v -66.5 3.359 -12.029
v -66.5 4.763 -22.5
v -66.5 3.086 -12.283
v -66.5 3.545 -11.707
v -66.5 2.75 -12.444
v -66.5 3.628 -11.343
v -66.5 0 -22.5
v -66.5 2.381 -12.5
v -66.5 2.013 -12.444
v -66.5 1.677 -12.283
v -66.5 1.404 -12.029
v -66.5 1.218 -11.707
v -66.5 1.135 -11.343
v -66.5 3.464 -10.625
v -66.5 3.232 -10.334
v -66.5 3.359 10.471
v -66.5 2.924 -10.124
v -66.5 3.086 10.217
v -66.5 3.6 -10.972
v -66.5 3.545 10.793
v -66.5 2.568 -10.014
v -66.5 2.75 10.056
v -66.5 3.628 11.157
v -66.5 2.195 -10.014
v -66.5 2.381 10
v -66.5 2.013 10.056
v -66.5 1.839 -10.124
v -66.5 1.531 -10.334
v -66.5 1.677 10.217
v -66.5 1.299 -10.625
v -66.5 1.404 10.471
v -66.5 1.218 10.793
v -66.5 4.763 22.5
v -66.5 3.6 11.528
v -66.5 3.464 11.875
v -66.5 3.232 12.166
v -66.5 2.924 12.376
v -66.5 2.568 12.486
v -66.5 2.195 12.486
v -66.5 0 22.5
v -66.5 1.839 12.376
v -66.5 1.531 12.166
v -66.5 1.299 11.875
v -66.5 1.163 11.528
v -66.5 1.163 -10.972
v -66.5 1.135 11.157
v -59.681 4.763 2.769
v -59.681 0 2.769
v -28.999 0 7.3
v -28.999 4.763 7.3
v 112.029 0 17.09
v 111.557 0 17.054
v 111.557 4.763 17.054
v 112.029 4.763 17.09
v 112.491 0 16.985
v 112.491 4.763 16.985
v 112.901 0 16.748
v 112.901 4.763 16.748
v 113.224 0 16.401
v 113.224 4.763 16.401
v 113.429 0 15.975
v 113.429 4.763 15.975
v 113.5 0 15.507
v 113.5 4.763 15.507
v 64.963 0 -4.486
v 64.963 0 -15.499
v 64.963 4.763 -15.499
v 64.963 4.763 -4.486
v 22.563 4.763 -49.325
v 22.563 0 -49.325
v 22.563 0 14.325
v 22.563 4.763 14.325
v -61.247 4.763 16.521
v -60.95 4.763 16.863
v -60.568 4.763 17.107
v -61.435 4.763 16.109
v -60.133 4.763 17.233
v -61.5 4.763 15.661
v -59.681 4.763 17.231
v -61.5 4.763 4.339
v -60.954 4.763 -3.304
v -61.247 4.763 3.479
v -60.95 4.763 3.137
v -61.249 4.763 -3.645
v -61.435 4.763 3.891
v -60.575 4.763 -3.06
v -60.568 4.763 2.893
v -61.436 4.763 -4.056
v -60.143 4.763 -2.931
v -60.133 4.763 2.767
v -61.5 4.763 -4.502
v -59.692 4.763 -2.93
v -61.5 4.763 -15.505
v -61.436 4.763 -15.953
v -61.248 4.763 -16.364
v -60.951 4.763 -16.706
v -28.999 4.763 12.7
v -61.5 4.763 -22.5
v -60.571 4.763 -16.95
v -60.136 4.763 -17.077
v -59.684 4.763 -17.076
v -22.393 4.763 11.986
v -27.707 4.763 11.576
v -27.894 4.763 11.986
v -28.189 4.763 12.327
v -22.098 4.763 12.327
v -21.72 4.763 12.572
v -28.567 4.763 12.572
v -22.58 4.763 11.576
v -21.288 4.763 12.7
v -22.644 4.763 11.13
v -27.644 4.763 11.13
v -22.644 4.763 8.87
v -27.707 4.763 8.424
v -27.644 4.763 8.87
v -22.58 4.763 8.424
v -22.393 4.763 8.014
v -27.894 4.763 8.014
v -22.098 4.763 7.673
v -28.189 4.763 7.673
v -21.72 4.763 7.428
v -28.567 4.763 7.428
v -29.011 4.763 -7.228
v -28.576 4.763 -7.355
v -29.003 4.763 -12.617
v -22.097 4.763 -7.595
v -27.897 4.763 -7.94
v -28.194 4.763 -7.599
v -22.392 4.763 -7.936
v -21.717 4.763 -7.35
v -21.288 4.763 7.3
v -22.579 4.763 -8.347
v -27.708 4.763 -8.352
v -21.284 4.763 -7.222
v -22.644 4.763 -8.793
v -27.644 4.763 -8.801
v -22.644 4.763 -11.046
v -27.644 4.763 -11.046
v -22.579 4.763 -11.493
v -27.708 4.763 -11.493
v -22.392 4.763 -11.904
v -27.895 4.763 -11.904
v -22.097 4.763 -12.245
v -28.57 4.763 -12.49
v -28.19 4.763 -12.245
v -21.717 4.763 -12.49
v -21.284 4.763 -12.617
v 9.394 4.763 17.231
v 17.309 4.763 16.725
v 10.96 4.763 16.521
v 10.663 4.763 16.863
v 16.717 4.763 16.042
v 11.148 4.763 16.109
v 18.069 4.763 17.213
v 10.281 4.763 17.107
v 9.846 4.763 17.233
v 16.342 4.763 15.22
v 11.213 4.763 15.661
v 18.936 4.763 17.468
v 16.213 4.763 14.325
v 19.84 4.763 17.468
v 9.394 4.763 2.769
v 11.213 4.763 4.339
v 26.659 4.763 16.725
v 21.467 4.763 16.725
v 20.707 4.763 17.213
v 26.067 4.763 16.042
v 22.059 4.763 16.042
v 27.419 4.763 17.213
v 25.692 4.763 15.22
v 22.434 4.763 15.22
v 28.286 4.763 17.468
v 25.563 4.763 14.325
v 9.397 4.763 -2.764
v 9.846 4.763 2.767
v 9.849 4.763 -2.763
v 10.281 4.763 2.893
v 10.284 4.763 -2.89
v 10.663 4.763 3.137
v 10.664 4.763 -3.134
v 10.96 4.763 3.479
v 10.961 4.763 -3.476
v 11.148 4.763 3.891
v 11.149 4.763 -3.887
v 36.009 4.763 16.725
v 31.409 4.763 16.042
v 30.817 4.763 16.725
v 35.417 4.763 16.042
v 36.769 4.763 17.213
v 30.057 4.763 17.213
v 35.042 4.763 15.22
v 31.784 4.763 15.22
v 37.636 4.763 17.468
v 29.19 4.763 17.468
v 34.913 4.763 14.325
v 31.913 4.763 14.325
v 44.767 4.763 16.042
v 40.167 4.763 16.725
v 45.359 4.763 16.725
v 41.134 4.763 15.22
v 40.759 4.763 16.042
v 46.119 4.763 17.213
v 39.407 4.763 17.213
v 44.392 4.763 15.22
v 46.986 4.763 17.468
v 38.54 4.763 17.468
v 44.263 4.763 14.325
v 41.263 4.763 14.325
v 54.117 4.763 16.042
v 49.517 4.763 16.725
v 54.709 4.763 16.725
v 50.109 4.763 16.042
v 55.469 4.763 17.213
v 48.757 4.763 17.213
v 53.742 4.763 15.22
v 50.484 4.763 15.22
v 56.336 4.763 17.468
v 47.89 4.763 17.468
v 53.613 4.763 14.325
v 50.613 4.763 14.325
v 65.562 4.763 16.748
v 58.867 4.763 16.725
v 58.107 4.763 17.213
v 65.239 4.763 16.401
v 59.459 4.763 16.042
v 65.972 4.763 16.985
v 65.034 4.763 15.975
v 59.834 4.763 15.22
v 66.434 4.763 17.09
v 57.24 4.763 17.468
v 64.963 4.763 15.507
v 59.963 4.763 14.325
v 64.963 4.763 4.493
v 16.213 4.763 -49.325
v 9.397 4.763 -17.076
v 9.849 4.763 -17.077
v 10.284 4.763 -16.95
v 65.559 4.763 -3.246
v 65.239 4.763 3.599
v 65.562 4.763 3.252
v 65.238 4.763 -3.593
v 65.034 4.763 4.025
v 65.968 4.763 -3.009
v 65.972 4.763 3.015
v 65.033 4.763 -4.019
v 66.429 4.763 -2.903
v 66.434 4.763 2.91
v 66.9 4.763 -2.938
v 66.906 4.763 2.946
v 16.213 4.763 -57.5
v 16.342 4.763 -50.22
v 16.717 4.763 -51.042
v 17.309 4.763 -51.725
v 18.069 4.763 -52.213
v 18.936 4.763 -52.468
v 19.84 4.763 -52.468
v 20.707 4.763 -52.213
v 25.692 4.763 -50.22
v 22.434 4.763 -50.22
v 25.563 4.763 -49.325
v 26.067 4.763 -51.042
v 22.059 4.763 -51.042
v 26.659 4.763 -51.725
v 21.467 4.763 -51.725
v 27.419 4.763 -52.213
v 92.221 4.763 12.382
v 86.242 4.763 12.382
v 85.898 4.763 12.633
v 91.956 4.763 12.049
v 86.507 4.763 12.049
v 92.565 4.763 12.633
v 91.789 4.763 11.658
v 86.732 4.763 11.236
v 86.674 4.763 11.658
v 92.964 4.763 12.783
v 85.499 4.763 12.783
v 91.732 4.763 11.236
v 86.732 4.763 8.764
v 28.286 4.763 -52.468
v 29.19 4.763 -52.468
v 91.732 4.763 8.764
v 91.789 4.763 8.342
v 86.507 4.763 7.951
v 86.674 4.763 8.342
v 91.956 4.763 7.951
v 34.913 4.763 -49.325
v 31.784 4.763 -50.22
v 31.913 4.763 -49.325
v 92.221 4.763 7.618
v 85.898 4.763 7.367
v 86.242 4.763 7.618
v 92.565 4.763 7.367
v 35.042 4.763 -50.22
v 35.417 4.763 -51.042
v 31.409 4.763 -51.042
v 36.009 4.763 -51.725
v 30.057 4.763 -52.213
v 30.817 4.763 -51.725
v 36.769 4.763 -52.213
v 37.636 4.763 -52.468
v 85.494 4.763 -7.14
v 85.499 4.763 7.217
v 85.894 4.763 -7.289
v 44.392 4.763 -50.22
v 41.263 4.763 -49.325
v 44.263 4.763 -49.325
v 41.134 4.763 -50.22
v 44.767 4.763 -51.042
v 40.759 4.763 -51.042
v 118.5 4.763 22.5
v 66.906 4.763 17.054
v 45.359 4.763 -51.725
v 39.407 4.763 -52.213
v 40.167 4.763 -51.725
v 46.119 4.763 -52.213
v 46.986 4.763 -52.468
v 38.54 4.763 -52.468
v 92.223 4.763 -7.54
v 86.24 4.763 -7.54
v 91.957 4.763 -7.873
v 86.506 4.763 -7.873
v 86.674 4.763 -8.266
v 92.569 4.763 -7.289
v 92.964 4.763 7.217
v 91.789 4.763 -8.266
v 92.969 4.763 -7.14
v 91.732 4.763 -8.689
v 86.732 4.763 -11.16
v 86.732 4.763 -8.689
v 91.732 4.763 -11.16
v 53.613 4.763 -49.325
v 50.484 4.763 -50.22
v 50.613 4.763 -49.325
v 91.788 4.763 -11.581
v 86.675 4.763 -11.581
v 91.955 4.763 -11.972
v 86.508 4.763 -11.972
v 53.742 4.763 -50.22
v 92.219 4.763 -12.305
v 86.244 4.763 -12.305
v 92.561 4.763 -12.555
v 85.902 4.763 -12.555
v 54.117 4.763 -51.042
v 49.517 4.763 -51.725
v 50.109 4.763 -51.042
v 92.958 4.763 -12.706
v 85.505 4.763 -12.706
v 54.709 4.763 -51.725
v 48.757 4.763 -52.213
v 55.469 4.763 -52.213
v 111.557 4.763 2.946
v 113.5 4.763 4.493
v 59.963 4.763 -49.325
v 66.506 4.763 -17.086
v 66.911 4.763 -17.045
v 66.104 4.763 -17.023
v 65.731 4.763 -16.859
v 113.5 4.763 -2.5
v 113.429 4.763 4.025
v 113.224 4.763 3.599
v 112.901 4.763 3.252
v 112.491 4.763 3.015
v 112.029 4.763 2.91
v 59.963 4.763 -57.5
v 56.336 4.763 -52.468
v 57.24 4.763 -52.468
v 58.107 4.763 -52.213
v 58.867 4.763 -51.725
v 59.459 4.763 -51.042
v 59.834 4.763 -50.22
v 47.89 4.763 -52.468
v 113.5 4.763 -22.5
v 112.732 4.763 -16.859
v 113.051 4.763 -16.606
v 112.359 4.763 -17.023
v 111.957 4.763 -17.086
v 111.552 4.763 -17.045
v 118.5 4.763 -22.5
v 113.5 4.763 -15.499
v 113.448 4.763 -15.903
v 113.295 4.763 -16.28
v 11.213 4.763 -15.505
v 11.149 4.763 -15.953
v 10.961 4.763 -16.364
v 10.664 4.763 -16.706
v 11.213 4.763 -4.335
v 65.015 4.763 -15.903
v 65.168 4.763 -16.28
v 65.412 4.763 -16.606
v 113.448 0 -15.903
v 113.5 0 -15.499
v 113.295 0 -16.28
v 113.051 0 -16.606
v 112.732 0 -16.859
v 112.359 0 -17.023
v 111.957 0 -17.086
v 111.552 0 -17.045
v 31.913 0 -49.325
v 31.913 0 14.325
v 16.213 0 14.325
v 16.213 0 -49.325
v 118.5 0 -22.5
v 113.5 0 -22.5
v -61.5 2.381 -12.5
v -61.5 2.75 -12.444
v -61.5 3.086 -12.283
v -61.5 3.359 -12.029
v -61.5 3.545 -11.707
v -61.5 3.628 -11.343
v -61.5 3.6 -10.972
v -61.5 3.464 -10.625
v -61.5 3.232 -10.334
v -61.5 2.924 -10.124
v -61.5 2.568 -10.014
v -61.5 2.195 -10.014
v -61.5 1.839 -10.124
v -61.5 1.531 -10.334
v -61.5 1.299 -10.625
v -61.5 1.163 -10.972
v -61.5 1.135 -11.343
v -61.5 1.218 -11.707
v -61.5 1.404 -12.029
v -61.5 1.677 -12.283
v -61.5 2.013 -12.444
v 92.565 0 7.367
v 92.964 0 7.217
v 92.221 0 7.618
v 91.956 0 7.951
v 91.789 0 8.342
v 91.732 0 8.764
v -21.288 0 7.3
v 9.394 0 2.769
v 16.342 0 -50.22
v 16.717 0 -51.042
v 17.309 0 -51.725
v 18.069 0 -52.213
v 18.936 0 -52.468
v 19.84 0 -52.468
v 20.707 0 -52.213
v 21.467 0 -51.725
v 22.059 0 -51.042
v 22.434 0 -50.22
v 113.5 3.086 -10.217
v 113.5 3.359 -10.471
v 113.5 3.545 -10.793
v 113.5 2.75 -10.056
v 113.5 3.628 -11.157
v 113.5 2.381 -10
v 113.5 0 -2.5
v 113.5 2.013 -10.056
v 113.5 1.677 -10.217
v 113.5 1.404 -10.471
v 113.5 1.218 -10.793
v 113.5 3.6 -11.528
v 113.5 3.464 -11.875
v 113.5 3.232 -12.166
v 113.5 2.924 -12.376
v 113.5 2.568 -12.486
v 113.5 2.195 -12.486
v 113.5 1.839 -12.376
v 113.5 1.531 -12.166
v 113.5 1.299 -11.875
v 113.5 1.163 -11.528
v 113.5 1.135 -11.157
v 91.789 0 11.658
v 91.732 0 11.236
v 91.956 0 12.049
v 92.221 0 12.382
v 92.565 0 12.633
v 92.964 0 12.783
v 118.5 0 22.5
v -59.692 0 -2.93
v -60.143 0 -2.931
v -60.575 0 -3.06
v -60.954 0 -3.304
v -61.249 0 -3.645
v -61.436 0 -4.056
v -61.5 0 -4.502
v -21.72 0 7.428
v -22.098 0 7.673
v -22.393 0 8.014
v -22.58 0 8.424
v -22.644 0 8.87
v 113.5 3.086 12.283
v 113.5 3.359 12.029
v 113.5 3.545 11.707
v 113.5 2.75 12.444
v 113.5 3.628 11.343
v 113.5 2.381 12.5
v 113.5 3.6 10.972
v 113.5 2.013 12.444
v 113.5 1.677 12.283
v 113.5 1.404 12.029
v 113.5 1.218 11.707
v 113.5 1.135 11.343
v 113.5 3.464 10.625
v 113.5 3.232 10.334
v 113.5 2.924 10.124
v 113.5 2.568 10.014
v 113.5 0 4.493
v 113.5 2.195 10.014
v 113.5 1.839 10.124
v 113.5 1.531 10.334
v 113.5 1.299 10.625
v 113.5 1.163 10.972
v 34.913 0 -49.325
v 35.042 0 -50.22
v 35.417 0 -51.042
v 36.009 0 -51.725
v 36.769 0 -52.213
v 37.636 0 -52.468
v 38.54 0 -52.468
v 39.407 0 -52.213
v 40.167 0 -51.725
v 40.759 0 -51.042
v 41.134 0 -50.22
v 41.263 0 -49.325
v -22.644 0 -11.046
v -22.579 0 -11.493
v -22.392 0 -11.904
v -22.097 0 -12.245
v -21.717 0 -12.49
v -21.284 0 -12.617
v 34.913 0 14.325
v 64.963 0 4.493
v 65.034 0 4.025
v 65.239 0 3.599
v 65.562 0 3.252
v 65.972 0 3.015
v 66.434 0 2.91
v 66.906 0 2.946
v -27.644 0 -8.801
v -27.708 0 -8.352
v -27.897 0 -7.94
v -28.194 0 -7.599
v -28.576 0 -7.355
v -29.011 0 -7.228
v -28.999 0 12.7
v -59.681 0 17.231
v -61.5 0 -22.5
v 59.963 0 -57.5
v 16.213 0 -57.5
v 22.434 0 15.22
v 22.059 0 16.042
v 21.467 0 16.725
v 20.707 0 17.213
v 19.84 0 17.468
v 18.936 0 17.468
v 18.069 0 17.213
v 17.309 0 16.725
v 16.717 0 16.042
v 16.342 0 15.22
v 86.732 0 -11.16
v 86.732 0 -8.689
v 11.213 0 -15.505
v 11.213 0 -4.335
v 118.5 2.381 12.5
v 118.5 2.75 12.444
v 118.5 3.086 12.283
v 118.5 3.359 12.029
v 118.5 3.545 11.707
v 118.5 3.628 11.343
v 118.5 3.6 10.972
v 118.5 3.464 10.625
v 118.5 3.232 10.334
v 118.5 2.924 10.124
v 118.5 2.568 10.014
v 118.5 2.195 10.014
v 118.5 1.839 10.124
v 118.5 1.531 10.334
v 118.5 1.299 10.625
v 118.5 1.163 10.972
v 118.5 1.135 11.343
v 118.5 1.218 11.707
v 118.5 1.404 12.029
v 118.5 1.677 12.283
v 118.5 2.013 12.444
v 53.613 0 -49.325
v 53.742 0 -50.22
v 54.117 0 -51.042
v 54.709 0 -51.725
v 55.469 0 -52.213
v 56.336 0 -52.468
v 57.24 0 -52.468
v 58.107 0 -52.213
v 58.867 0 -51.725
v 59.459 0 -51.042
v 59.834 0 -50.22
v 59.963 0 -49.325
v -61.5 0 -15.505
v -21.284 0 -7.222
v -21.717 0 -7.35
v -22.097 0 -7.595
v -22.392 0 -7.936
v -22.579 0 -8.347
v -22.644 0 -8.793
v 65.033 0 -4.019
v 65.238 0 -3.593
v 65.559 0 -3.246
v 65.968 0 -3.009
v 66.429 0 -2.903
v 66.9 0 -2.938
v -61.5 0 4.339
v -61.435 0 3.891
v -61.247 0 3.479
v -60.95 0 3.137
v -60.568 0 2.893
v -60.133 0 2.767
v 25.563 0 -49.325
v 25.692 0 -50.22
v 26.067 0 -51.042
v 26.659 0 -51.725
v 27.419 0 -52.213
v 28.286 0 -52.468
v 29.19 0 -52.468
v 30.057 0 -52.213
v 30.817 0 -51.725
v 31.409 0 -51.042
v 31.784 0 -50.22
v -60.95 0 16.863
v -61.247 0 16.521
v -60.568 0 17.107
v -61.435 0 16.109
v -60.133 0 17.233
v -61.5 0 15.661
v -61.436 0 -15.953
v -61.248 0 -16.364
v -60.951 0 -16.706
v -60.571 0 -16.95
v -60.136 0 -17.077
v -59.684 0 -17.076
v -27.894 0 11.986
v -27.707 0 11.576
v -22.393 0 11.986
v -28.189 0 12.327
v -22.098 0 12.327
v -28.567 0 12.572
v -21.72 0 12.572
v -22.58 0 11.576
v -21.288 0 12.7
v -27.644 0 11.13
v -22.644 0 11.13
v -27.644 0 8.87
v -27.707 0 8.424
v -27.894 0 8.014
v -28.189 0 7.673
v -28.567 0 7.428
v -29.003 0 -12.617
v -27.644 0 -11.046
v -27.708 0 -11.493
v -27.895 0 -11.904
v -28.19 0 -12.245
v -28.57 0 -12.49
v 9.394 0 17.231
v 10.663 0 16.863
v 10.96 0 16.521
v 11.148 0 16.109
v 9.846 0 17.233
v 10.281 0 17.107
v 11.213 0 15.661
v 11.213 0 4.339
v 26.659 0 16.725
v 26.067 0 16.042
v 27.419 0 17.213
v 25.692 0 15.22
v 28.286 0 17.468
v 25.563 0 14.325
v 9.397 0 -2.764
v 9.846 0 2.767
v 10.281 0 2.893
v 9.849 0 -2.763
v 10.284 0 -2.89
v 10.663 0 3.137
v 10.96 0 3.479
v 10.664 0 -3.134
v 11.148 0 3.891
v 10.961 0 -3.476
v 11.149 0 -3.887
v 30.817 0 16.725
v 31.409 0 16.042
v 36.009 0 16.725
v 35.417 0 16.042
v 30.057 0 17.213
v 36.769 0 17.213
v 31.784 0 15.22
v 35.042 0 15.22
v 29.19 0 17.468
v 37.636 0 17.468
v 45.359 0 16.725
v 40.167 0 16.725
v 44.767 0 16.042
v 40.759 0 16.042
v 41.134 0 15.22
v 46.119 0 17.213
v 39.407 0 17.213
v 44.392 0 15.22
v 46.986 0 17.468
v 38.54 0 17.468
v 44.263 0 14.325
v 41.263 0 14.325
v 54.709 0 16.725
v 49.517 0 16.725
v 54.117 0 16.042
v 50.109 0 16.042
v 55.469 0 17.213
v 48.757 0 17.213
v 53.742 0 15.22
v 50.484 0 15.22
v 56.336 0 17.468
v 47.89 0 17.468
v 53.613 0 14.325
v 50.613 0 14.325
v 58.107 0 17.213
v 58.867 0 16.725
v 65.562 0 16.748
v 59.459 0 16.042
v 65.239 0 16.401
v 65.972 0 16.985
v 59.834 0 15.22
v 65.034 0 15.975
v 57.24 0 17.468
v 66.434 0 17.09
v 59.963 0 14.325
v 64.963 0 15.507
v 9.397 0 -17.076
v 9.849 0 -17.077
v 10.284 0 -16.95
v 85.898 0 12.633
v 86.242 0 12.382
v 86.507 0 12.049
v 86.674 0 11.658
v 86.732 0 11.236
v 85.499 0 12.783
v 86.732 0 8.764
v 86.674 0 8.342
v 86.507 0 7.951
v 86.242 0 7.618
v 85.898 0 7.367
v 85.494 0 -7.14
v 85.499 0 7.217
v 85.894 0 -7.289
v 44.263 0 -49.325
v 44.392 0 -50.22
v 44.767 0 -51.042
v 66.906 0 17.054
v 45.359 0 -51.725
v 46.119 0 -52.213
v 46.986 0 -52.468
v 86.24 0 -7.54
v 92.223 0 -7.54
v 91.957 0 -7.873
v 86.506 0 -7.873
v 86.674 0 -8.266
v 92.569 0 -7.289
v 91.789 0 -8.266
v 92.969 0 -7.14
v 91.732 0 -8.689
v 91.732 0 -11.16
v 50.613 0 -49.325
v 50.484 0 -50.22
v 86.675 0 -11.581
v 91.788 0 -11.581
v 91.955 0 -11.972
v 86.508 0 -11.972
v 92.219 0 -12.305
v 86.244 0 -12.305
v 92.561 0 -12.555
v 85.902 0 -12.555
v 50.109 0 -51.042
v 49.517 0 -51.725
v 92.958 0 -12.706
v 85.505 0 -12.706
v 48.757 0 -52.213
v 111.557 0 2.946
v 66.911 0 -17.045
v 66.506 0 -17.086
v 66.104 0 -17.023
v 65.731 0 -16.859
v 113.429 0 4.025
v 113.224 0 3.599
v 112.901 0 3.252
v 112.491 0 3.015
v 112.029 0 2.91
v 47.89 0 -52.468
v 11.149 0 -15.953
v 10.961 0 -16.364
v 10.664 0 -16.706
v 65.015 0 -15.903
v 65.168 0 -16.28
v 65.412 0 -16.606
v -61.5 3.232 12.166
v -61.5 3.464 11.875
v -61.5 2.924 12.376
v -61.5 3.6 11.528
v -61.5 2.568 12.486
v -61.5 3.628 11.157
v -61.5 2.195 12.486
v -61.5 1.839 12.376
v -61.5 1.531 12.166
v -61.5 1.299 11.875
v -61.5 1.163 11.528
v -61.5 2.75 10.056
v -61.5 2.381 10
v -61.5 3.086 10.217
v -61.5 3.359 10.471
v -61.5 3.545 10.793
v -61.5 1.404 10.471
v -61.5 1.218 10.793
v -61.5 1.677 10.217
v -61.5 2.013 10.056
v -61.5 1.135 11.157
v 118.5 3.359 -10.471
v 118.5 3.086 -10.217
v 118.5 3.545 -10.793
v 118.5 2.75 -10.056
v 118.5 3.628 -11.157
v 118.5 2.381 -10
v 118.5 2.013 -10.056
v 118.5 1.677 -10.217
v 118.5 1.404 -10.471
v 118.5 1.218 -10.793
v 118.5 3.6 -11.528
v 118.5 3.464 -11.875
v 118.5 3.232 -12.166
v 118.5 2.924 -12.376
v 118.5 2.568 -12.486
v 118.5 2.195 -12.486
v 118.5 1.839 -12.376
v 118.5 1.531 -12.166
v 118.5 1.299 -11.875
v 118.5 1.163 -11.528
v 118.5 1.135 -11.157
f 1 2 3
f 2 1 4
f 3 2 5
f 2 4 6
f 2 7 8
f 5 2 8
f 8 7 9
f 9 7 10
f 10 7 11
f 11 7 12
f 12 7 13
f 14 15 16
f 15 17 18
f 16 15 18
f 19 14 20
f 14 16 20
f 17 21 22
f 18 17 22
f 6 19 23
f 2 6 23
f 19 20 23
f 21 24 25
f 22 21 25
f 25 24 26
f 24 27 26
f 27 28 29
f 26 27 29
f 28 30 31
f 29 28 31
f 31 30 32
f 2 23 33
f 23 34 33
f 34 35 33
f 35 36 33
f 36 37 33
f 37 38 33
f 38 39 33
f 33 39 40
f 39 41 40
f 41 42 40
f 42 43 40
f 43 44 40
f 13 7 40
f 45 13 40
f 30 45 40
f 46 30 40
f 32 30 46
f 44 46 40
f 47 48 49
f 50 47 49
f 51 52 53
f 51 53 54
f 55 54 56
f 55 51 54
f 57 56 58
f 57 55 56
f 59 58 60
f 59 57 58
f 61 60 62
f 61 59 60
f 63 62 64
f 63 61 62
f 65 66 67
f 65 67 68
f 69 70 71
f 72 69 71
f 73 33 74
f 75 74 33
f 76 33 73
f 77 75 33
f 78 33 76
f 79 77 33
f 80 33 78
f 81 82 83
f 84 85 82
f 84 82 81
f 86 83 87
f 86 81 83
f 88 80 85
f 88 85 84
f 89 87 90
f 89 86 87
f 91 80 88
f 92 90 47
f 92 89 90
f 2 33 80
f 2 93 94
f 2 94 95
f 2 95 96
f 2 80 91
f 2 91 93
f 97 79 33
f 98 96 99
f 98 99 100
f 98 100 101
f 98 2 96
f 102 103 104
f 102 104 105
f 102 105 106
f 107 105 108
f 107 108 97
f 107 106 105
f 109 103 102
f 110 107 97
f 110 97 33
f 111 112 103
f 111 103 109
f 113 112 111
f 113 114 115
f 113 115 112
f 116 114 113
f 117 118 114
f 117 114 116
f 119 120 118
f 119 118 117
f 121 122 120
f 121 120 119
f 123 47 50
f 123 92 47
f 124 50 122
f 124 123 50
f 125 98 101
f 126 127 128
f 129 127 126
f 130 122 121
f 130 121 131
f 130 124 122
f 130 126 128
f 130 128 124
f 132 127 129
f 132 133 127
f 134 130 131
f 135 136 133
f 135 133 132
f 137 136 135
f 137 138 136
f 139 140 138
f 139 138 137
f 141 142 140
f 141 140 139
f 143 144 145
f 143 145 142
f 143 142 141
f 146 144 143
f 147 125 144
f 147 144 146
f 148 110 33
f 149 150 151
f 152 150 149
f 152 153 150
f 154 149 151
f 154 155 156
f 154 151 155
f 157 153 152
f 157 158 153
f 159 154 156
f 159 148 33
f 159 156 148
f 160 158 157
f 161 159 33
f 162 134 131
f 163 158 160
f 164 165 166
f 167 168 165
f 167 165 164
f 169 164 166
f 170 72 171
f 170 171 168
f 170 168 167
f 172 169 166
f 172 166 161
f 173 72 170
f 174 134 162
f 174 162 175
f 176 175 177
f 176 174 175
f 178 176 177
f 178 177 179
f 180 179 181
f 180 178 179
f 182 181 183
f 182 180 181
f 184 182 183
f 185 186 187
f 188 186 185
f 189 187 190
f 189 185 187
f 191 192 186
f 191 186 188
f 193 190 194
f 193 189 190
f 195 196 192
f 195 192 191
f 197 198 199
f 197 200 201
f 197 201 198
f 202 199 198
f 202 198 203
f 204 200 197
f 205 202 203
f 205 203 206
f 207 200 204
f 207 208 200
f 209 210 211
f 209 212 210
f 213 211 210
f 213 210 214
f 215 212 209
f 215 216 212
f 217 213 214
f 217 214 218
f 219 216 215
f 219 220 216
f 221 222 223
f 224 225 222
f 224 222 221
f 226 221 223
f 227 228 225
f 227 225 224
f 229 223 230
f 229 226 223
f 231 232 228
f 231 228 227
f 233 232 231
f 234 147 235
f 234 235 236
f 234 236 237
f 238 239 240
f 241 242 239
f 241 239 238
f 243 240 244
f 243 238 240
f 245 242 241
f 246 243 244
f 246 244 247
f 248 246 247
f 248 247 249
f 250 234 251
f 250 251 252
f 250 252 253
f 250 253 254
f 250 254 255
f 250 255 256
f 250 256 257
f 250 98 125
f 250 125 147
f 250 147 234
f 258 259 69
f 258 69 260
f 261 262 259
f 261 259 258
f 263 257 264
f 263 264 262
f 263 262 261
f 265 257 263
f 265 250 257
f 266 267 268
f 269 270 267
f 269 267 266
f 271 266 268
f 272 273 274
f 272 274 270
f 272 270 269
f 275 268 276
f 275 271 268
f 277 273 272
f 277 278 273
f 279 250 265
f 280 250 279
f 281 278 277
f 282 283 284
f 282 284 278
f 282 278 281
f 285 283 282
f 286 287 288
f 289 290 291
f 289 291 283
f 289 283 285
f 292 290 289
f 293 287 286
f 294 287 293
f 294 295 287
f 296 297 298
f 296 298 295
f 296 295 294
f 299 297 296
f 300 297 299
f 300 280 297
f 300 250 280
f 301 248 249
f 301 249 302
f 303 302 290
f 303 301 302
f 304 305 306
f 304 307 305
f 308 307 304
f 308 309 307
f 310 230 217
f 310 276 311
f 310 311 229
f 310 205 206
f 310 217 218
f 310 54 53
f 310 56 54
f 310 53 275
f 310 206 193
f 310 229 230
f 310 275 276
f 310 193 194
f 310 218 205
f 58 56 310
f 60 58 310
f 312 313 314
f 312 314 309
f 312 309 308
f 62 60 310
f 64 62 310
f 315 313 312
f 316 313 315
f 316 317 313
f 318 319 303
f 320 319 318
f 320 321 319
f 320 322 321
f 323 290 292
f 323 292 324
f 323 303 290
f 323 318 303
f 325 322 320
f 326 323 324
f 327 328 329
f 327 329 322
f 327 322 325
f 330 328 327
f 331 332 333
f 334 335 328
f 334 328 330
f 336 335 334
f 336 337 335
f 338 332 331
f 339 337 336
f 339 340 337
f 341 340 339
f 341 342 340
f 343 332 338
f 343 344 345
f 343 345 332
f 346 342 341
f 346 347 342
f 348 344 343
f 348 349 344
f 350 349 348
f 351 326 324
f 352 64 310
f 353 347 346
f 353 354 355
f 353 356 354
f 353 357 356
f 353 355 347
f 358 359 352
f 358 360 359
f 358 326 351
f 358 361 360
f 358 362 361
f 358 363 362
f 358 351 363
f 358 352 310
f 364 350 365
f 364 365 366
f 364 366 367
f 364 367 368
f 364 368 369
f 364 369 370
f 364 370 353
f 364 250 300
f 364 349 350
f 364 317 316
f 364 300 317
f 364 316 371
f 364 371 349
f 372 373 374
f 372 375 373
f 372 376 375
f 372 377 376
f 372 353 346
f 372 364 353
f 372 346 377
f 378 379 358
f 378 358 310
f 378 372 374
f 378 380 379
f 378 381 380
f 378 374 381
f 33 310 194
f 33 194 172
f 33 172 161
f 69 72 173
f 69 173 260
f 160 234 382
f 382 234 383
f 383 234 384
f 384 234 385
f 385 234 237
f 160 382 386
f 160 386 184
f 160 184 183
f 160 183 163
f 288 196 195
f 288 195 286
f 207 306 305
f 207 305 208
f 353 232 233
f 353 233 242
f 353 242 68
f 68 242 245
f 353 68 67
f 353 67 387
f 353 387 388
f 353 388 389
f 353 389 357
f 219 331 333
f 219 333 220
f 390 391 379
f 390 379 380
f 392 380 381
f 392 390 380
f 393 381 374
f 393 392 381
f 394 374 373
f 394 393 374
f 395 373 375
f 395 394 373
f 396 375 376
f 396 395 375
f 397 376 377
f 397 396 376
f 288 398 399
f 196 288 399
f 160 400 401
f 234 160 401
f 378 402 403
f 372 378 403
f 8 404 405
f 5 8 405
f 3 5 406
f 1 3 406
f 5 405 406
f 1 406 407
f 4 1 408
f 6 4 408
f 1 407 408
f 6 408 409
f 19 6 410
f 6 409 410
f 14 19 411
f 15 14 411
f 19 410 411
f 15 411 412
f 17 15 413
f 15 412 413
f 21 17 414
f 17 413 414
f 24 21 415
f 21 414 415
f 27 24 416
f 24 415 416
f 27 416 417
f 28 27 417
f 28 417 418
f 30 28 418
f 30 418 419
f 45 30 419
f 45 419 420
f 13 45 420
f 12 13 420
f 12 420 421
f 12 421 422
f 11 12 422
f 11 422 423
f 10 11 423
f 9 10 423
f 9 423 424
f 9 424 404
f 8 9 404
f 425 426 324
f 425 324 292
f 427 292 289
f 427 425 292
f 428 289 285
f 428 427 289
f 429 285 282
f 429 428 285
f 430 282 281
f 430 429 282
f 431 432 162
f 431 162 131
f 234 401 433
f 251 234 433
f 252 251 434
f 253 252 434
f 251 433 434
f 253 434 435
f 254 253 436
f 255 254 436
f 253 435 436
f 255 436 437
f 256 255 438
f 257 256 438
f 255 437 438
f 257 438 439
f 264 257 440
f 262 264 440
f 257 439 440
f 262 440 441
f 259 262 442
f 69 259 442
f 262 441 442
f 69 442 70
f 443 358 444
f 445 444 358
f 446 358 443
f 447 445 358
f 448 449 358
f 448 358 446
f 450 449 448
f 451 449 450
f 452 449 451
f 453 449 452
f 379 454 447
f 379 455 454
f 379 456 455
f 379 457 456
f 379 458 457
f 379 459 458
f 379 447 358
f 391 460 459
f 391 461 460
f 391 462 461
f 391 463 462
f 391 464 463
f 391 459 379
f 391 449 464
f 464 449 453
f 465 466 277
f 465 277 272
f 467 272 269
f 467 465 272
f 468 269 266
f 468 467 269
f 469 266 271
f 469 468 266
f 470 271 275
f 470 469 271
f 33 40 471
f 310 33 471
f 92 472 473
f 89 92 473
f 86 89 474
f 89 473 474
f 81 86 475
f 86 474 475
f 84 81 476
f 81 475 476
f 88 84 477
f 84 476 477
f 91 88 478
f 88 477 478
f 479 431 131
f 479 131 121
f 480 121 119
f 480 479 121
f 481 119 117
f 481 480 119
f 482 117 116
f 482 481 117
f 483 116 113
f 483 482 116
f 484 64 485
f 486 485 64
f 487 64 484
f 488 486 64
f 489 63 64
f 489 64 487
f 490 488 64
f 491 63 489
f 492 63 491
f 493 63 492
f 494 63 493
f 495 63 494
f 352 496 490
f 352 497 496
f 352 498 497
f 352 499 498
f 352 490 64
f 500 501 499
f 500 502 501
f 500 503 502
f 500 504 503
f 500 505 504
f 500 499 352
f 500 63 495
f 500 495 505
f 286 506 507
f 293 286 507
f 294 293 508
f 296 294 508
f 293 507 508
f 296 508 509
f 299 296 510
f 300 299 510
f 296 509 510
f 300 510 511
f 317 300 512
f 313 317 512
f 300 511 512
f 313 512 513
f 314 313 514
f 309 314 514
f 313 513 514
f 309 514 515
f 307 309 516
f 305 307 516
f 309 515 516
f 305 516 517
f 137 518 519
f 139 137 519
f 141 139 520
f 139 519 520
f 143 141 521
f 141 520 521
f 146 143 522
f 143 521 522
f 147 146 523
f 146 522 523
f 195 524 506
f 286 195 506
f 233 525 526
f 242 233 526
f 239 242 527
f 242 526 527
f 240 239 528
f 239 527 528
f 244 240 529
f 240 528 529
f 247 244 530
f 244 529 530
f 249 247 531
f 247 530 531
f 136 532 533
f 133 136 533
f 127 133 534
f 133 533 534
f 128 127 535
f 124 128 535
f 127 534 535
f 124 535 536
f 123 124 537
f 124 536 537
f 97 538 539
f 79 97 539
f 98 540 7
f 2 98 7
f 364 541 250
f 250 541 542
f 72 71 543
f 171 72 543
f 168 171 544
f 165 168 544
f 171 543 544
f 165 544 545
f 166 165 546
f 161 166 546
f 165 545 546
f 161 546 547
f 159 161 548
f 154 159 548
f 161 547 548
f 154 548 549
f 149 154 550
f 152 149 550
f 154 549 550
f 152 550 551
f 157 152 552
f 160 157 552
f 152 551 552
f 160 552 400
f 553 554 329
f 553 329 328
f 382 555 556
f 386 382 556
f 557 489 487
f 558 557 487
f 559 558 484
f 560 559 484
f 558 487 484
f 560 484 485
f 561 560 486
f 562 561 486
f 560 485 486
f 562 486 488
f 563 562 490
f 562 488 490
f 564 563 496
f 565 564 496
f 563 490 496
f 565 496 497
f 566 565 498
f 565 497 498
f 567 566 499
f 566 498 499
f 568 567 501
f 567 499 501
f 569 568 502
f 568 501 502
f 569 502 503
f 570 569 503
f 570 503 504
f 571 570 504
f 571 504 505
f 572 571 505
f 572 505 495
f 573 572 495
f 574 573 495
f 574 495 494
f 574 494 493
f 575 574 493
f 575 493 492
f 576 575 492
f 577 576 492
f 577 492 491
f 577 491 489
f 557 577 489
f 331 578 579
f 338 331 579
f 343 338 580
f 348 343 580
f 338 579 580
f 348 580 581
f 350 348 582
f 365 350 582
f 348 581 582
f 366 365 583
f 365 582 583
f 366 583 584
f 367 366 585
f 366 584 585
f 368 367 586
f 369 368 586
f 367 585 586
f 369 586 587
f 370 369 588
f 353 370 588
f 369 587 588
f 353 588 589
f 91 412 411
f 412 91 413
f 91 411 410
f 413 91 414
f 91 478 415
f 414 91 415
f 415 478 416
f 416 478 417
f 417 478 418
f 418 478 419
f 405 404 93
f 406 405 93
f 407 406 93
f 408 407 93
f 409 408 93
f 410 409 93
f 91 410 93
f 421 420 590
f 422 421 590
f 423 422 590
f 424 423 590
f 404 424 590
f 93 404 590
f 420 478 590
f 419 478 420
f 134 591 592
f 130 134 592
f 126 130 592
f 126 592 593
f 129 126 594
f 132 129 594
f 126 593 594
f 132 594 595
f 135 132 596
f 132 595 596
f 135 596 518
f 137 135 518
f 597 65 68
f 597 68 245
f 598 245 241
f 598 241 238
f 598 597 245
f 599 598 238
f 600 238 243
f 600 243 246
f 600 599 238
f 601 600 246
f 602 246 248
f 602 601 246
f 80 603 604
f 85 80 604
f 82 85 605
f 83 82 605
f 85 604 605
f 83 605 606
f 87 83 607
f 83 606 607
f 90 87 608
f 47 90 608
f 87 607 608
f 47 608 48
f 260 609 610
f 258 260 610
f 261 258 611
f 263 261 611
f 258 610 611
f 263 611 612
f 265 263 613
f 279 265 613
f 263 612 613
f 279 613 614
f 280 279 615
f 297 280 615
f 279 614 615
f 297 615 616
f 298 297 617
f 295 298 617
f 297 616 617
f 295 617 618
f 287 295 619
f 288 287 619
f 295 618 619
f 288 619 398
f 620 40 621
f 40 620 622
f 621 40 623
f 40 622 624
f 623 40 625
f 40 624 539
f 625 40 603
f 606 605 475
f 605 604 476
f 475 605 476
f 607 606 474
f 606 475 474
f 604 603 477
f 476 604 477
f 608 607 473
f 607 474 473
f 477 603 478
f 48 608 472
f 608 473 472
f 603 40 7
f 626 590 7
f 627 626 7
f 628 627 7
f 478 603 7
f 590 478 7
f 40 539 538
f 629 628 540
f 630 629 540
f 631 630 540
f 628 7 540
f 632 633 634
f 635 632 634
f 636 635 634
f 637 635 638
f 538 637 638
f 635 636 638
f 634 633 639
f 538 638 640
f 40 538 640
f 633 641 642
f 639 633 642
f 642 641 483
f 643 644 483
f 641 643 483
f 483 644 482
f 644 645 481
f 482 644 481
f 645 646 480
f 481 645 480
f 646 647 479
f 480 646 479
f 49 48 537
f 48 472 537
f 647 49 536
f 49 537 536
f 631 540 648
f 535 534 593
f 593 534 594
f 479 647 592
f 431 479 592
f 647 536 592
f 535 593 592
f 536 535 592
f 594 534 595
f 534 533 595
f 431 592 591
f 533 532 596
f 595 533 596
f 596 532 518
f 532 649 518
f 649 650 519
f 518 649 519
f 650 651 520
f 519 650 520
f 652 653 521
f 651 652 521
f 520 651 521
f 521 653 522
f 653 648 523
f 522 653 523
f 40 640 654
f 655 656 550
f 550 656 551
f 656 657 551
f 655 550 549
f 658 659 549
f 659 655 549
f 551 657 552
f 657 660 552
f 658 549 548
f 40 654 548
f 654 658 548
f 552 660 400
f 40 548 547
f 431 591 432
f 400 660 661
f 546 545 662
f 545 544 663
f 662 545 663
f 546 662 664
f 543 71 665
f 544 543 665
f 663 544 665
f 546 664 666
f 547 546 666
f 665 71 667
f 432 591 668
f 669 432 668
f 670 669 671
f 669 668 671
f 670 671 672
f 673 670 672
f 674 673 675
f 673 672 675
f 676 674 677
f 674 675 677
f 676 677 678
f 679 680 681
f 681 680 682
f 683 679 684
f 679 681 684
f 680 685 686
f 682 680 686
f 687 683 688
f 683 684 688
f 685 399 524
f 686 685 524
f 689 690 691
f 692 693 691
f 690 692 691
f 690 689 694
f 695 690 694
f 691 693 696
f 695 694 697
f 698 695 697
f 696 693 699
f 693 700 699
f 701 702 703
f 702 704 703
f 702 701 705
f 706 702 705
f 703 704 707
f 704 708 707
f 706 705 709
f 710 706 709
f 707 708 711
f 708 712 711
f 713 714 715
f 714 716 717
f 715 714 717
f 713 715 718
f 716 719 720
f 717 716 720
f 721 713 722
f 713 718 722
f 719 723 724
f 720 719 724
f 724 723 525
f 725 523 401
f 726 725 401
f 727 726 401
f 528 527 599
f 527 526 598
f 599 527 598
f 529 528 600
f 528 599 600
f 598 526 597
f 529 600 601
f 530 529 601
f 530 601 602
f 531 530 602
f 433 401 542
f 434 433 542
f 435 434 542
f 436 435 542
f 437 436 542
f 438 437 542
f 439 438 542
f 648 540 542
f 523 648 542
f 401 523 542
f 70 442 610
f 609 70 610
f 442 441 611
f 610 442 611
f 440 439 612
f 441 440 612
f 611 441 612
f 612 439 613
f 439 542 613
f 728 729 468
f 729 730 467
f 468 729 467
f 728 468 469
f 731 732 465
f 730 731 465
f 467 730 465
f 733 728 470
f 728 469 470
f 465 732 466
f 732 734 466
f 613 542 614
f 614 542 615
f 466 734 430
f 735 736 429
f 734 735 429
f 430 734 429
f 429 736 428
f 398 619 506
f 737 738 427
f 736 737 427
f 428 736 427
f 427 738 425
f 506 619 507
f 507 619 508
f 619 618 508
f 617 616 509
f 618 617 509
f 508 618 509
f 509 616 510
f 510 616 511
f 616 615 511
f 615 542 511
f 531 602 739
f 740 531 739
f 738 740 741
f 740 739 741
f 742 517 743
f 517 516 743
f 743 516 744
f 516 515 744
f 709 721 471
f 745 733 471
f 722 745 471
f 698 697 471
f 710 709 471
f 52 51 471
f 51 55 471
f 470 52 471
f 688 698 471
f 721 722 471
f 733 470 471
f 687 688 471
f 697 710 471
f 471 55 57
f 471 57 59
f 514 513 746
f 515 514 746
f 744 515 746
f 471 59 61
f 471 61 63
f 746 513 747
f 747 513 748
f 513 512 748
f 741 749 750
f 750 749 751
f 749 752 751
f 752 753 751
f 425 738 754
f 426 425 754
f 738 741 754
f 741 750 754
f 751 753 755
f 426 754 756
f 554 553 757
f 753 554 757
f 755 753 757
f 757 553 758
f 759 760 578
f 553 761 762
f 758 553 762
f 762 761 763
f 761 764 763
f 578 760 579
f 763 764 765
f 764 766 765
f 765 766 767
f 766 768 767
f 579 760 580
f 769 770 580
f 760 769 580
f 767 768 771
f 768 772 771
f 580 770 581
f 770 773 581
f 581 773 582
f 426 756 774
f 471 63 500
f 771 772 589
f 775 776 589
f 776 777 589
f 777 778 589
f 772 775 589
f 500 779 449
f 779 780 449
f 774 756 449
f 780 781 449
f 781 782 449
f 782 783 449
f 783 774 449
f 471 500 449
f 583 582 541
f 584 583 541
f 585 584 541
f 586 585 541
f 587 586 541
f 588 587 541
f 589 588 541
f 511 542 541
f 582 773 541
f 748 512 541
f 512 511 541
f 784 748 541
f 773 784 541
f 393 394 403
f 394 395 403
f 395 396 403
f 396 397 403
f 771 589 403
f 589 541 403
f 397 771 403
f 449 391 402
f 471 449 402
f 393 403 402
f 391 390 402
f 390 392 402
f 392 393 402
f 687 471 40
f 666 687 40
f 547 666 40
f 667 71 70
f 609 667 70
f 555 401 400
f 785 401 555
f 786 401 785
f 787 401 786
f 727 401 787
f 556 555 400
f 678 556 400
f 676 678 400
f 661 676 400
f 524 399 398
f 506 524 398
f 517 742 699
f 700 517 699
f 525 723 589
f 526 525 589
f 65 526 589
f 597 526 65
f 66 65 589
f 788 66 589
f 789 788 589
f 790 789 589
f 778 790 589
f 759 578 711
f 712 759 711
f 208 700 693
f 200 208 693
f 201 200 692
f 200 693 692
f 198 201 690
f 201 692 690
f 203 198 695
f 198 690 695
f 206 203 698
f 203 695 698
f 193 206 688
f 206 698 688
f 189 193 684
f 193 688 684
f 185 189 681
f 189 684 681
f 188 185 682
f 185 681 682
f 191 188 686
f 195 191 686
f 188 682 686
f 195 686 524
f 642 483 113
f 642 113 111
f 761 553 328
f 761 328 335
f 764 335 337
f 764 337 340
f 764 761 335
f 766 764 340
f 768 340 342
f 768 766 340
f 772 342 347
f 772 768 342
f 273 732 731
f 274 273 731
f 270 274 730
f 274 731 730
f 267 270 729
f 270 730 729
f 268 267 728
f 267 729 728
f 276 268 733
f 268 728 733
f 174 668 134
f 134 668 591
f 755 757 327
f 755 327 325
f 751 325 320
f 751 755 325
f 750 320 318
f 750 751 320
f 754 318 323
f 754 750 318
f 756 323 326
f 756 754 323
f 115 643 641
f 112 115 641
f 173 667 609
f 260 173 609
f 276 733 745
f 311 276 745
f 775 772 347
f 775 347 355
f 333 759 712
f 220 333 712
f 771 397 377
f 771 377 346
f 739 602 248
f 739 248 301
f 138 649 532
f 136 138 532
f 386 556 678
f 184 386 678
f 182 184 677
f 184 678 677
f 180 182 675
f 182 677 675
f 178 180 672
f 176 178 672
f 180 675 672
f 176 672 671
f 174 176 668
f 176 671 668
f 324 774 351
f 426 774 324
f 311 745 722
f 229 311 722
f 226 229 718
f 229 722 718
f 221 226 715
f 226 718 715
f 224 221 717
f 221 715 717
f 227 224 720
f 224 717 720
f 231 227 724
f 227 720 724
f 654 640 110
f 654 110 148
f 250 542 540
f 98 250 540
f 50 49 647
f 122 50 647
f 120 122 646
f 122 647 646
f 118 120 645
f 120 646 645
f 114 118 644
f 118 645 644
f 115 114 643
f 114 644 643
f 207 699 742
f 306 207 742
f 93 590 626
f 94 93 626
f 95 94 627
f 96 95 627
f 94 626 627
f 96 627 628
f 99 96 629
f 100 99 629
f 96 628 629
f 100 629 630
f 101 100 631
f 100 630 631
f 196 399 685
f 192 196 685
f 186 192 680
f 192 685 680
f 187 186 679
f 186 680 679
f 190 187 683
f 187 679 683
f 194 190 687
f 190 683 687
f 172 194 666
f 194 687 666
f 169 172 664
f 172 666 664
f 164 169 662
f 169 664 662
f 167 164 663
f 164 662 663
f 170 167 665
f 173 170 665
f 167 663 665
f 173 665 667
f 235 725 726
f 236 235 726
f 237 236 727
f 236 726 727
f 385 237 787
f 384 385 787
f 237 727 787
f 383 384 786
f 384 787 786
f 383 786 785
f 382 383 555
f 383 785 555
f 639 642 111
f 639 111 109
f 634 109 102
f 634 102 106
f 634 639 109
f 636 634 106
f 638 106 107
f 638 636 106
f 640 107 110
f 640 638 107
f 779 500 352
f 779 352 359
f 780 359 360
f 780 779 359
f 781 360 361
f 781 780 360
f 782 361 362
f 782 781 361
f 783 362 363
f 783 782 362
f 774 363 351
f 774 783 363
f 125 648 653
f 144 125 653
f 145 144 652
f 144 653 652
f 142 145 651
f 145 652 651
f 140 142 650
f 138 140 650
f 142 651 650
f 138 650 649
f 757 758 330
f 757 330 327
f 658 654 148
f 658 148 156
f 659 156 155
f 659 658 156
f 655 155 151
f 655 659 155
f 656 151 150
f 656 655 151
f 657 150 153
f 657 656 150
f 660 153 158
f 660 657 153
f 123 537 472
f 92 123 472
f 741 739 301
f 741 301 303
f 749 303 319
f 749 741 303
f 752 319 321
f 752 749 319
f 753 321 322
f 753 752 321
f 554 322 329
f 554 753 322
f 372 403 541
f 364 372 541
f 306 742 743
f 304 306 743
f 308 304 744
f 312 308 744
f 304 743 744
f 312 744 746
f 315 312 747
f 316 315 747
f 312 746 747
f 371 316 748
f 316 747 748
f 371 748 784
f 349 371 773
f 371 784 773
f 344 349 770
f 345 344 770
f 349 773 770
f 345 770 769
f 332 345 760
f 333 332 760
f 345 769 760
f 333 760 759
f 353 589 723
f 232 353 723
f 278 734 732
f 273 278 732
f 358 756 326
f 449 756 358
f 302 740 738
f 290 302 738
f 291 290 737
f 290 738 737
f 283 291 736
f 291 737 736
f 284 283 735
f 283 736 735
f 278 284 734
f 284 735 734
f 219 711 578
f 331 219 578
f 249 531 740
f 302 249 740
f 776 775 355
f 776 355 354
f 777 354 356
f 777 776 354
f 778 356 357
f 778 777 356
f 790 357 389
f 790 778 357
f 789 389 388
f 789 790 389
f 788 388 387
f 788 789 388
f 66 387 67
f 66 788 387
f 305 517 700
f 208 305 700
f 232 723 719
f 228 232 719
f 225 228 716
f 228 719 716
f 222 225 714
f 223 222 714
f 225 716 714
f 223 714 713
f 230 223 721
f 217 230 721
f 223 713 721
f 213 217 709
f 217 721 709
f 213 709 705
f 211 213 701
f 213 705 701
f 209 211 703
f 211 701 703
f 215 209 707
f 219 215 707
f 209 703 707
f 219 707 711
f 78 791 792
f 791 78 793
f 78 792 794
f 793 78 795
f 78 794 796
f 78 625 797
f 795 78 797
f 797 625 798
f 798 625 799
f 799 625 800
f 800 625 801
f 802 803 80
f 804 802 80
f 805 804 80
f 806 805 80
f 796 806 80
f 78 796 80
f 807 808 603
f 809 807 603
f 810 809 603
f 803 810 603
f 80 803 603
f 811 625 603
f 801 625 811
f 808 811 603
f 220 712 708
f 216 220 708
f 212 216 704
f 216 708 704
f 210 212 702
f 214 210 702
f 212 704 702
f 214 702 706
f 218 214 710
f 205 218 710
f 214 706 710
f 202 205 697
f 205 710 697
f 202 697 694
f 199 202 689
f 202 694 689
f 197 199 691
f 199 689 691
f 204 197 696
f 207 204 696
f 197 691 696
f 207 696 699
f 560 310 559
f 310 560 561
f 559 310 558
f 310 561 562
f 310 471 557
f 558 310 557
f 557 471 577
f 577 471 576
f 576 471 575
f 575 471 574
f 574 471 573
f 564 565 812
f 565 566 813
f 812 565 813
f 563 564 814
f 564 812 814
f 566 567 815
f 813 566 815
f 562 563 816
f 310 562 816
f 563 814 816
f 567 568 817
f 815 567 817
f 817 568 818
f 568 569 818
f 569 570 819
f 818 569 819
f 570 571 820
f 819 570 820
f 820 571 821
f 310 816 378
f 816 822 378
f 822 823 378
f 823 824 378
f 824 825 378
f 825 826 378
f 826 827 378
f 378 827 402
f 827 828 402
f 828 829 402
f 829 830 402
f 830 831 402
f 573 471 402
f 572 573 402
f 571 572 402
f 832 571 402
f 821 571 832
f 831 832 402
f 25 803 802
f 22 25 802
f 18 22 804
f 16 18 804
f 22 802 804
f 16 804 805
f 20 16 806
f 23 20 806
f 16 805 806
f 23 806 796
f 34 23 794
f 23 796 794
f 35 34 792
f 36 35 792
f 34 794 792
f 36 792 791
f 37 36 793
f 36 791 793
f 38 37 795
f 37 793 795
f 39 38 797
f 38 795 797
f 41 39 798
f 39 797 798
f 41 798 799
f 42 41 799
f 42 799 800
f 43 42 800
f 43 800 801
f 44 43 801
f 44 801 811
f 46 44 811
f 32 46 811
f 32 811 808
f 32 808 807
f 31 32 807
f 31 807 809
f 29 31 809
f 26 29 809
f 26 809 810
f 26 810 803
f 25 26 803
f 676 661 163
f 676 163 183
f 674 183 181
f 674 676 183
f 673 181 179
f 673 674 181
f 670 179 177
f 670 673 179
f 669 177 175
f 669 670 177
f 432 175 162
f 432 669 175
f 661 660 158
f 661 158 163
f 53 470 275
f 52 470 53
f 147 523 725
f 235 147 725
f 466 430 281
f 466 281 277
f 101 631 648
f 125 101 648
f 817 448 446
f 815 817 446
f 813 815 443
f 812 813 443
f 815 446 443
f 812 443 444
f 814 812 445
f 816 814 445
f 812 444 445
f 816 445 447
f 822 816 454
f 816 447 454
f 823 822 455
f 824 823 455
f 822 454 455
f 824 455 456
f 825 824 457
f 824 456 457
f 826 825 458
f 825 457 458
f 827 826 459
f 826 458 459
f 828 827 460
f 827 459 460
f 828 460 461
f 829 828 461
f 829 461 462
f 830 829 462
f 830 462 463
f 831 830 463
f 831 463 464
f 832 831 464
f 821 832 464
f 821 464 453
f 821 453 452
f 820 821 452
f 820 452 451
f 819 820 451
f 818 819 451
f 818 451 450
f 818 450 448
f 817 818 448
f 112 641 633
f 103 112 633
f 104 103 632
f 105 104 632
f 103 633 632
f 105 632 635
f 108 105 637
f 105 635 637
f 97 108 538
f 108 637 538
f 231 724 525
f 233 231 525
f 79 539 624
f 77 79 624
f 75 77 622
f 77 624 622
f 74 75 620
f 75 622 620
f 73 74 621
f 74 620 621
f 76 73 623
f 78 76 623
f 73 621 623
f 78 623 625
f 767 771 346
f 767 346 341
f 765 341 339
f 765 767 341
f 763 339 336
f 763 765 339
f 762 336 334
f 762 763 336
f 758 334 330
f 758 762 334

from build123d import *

# Parameters (mm, degrees)
BOSS_EXTRUDE1_DEPTH             = 4.763
TAP_DRILL_FOR_M3X0_5_TAP1_D     = 2.5
TAP_DRILL_FOR_M3X0_5_TAP1_DEPTH = 5
TAP_DRILL_FOR_M3X0_5_TAP2_D     = 2.5
TAP_DRILL_FOR_M3X0_5_TAP2_DEPTH = 5


with BuildPart() as part:
    # Sketch2 → Boss-Extrude1 (new body)
    with BuildSketch(Plane(origin=(0, 0, 0), x_dir=(1, 0, 0), z_dir=(0, 1, 0))):
        Polygon((-66.5, -22.5), (118.5, -22.5), (118.5, 22.5), (113.5, 22.5), (59.963, 57.5), (16.213, 57.5), (-61.5, 22.5), (-66.5, 22.5), align=None)
        with BuildLine():
            Line((50.613, 49.325), (50.613, -14.325))
            ThreePointArc((50.613, -14.325), (47.438, -17.5), (44.263, -14.325))
            Line((44.263, -14.325), (44.263, 49.325))
            ThreePointArc((44.263, 49.325), (47.438, 52.5), (50.613, 49.325))
        make_face(mode=Mode.SUBTRACT)
        with BuildLine():
            Line((41.263, 49.325), (41.263, -14.325))
            ThreePointArc((41.263, -14.325), (38.088, -17.5), (34.913, -14.325))
            Line((34.913, -14.325), (34.913, 49.325))
            ThreePointArc((34.913, 49.325), (38.088, 52.5), (41.263, 49.325))
        make_face(mode=Mode.SUBTRACT)
        with BuildLine():
            Line((31.913, 49.325), (31.913, -14.325))
            ThreePointArc((31.913, -14.325), (28.738, -17.5), (25.563, -14.325))
            Line((25.563, -14.325), (25.563, 49.325))
            ThreePointArc((25.563, 49.325), (28.738, 52.5), (31.913, 49.325))
        make_face(mode=Mode.SUBTRACT)
        with BuildLine():
            Line((59.963, 49.325), (59.963, -14.325))
            ThreePointArc((59.963, -14.325), (56.788, -17.5), (53.613, -14.325))
            Line((53.613, -14.325), (53.613, 49.325))
            ThreePointArc((53.613, 49.325), (56.788, 52.5), (59.963, 49.325))
        make_face(mode=Mode.SUBTRACT)
        with BuildLine():
            Line((22.563, 49.325), (22.563, -14.325))
            ThreePointArc((22.563, -14.325), (19.388, -17.5), (16.213, -14.325))
            Line((16.213, -14.325), (16.213, 49.325))
            ThreePointArc((16.213, 49.325), (19.388, 52.5), (22.563, 49.325))
        make_face(mode=Mode.SUBTRACT)
        with BuildLine():
            Line((-59.6842053, 17.076061462), (-29.0027053, 12.617481945))
            ThreePointArc((-29.0027053, 12.617481945), (-28.030463852, 12.085169259), (-27.6435, 11.04648297))
            Line((-27.6435, 11.04648297), (-27.6435, 8.800559076))
            ThreePointArc((-27.6435, 8.800559076), (-28.033123359, 7.758806801), (-29.010741325, 7.228413292))
            Line((-29.010741325, 7.228413292), (-59.692241325, 2.929914643))
            ThreePointArc((-59.692241325, 2.929914643), (-60.954252275, 3.304183785), (-61.5, 4.502060427))
            Line((-61.5, 4.502060427), (-61.5, 15.505062487))
            ThreePointArc((-61.5, 15.505062487), (-60.951186289, 16.705598635), (-59.6842053, 17.076061462))
        make_face(mode=Mode.SUBTRACT)
        with BuildLine():
            Line((-59.680570174, -2.76869727), (-28.999070174, -7.299806511))
            ThreePointArc((-28.999070174, -7.299806511), (-28.029262747, -7.832976538), (-27.6435, -8.87027294))
            Line((-27.6435, -8.87027294), (-27.6435, -11.12972706))
            ThreePointArc((-27.6435, -11.12972706), (-28.029262747, -12.167023462), (-28.999070174, -12.700193489))
            Line((-28.999070174, -12.700193489), (-59.680570174, -17.23130273))
            ThreePointArc((-59.680570174, -17.23130273), (-60.949796402, -16.862573553), (-61.5, -15.6608363))
            Line((-61.5, -15.6608363), (-61.5, -4.3391637))
            ThreePointArc((-61.5, -4.3391637), (-60.949796402, -3.137426447), (-59.680570174, -2.76869727))
        make_face(mode=Mode.SUBTRACT)
        with BuildLine():
            Line((-22.6435, -8.87027294), (-22.6435, -11.12972706))
            ThreePointArc((-22.6435, -11.12972706), (-22.257737253, -12.167023462), (-21.287929826, -12.700193489))
            Line((-21.287929826, -12.700193489), (9.393570174, -17.23130273))
            ThreePointArc((9.393570174, -17.23130273), (10.662796402, -16.862573553), (11.213, -15.6608363))
            Line((11.213, -15.6608363), (11.213, -4.3391637))
            ThreePointArc((11.213, -4.3391637), (10.662796402, -3.137426447), (9.393570174, -2.76869727))
            Line((9.393570174, -2.76869727), (-21.287929826, -7.299806511))
            ThreePointArc((-21.287929826, -7.299806511), (-22.257737253, -7.832976538), (-22.6435, -8.87027294))
        make_face(mode=Mode.SUBTRACT)
        with BuildLine():
            Line((-22.6435, 8.79344646), (-22.6435, 11.04648297))
            ThreePointArc((-22.6435, 11.04648297), (-22.256536148, 12.085169259), (-21.2842947, 12.617481945))
            Line((-21.2842947, 12.617481945), (9.3972053, 17.076061462))
            ThreePointArc((9.3972053, 17.076061462), (10.664186289, 16.705598635), (11.213, 15.505062487))
            Line((11.213, 15.505062487), (11.213, 4.334866943))
            ThreePointArc((11.213, 4.334866943), (10.664186289, 3.134330795), (9.3972053, 2.763867968))
            Line((9.3972053, 2.763867968), (-21.2842947, 7.222447484))
            ThreePointArc((-21.2842947, 7.222447484), (-22.256536148, 7.754760171), (-22.6435, 8.79344646))
        make_face(mode=Mode.SUBTRACT)
        with BuildLine():
            Line((64.963, 15.499376461), (64.963, 4.486336964))
            ThreePointArc((64.963, 4.486336964), (65.559394235, 3.246229867), (66.900468488, 2.93789313))
            Line((66.900468488, 2.93789313), (85.493968488, 7.140266464))
            ThreePointArc((85.493968488, 7.140266464), (86.384107097, 7.697604533), (86.7315, 8.688710298))
            Line((86.7315, 8.688710298), (86.7315, 11.160279322))
            ThreePointArc((86.7315, 11.160279322), (86.387560859, 12.147048109), (85.504775415, 12.706240948))
            Line((85.504775415, 12.706240948), (66.911275415, 17.045338087))
            ThreePointArc((66.911275415, 17.045338087), (65.563731213, 16.74293732), (64.963, 15.499376461))
        make_face(mode=Mode.SUBTRACT)
        with BuildLine():
            Line((91.7315, 11.160279322), (91.7315, 8.688710298))
            ThreePointArc((91.7315, 8.688710298), (92.078892903, 7.697604533), (92.969031512, 7.140266464))
            Line((92.969031512, 7.140266464), (113.5, 2.5))
            Line((113.5, 2.5), (113.5, 15.499376461))
            ThreePointArc((113.5, 15.499376461), (112.899268787, 16.74293732), (111.551724585, 17.045338087))
            Line((111.551724585, 17.045338087), (92.958224585, 12.706240948))
            ThreePointArc((92.958224585, 12.706240948), (92.075439141, 12.147048109), (91.7315, 11.160279322))
        make_face(mode=Mode.SUBTRACT)
        with BuildLine():
            Line((86.7315, -8.764205555), (86.7315, -11.235794445))
            ThreePointArc((86.7315, -11.235794445), (86.385837257, -12.22473149), (85.499378453, -12.783005615))
            Line((85.499378453, -12.783005615), (66.905878453, -17.053740852))
            ThreePointArc((66.905878453, -17.053740852), (65.561562955, -16.748366938), (64.963, -15.506529682))
            Line((64.963, -15.506529682), (64.963, -4.493470318))
            ThreePointArc((64.963, -4.493470318), (65.561562955, -3.251633062), (66.905878453, -2.946259148))
            Line((66.905878453, -2.946259148), (85.499378453, -7.216994385))
            ThreePointArc((85.499378453, -7.216994385), (86.385837257, -7.77526851), (86.7315, -8.764205555))
        make_face(mode=Mode.SUBTRACT)
        with BuildLine():
            Line((91.7315, -8.764205555), (91.7315, -11.235794445))
            ThreePointArc((91.7315, -11.235794445), (92.077162743, -12.22473149), (92.963621547, -12.783005615))
            Line((92.963621547, -12.783005615), (111.557121547, -17.053740852))
            ThreePointArc((111.557121547, -17.053740852), (112.901437045, -16.748366938), (113.5, -15.506529682))
            Line((113.5, -15.506529682), (113.5, -4.493470318))
            ThreePointArc((113.5, -4.493470318), (112.901437045, -3.251633062), (111.557121547, -2.946259148))
            Line((111.557121547, -2.946259148), (92.963621547, -7.216994385))
            ThreePointArc((92.963621547, -7.216994385), (92.077162743, -7.77526851), (91.7315, -8.764205555))
        make_face(mode=Mode.SUBTRACT)
    extrude(amount=BOSS_EXTRUDE1_DEPTH)

    # Tap Drill for M3x0.5 Tap1
    with Locations(Plane(origin=(118.5, 0, 0), x_dir=(0, 0, -1), z_dir=(1, 0, 0))):
        with Locations((-11.25, 2.3815), (11.25, 2.3815)):
            Hole(TAP_DRILL_FOR_M3X0_5_TAP1_D / 2, depth=TAP_DRILL_FOR_M3X0_5_TAP1_DEPTH)

    # Tap Drill for M3x0.5 Tap2
    with Locations(Plane.ZY.offset(66.5)):
        with Locations((11.25, 2.3815), (-11.25, 2.3815)):
            Hole(TAP_DRILL_FOR_M3X0_5_TAP2_D / 2, depth=TAP_DRILL_FOR_M3X0_5_TAP2_DEPTH)


solid = part.part
